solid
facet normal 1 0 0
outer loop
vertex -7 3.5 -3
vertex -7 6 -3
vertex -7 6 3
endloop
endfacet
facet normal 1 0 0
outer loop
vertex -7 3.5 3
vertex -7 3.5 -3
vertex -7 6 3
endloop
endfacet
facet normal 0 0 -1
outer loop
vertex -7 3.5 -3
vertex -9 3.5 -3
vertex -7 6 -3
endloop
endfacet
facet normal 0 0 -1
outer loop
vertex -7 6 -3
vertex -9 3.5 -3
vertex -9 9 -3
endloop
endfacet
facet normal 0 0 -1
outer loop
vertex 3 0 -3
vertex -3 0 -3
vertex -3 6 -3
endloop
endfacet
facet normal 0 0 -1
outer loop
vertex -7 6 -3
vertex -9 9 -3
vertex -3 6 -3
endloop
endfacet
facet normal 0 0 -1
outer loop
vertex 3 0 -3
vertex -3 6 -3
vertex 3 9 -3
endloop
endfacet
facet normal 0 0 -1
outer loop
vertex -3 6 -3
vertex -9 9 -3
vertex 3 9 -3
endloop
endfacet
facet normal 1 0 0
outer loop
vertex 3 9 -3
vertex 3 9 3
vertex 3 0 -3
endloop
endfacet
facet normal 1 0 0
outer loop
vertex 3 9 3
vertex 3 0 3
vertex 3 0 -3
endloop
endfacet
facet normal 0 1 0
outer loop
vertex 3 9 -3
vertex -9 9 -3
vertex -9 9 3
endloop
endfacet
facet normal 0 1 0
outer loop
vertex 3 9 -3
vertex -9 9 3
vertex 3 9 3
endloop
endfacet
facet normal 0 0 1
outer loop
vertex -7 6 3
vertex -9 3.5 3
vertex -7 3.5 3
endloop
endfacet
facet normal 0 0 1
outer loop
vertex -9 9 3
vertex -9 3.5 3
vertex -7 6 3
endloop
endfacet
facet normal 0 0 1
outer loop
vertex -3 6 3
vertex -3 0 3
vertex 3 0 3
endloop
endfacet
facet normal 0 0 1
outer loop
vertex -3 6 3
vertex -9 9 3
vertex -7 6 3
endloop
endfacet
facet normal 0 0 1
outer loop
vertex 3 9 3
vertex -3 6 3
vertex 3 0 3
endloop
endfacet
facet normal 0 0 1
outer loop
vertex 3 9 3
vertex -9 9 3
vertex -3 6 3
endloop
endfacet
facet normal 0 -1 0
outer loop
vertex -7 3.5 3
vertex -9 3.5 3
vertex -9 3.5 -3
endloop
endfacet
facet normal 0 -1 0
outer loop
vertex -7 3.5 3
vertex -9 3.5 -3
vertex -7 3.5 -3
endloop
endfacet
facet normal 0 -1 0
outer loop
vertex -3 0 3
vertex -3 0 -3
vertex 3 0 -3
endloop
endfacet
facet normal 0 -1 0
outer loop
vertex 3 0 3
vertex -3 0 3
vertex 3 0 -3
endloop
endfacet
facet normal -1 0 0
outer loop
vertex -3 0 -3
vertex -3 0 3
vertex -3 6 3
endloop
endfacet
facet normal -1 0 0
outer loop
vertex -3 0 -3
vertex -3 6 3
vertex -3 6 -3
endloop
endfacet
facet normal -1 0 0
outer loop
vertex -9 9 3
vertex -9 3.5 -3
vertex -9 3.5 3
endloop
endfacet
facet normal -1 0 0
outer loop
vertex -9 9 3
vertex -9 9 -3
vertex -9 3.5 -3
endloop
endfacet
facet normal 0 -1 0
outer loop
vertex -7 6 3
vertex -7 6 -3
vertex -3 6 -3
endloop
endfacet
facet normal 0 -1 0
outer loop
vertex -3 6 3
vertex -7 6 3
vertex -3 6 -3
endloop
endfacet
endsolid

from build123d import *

# Parameters (mm, degrees)
SKETCH1_W           = 6
SKETCH1_H           = 6
BOSS_EXTRUDE1_DEPTH = 6
SKETCH2_W           = 12
SKETCH2_H           = 6
BOSS_EXTRUDE2_DEPTH = 3
SKETCH3_W           = 2
SKETCH3_H           = 6
BOSS_EXTRUDE3_DEPTH = 2.5


with BuildPart() as part:
    # Sketch1 → Boss-Extrude1 (new body)
    with BuildSketch(Plane(origin=(0, 0, 0), x_dir=(1, 0, 0), z_dir=(0, 1, 0))):
        Rectangle(SKETCH1_W, SKETCH1_H)
    extrude(amount=BOSS_EXTRUDE1_DEPTH)

    # Sketch2 → Boss-Extrude2 (add)
    with BuildSketch(Plane(origin=(0, 6, 0), x_dir=(1, 0, 0), z_dir=(0, 1, 0))):
        with Locations((-3, 0)):
            Rectangle(SKETCH2_W, SKETCH2_H)
    extrude(amount=BOSS_EXTRUDE2_DEPTH)

    # Sketch3 → Boss-Extrude3 (add)
    with BuildSketch(Plane.XZ.offset(-6)):
        with Locations((-8, 0)):
            Rectangle(SKETCH3_W, SKETCH3_H)
    extrude(amount=BOSS_EXTRUDE3_DEPTH)


solid = part.part
